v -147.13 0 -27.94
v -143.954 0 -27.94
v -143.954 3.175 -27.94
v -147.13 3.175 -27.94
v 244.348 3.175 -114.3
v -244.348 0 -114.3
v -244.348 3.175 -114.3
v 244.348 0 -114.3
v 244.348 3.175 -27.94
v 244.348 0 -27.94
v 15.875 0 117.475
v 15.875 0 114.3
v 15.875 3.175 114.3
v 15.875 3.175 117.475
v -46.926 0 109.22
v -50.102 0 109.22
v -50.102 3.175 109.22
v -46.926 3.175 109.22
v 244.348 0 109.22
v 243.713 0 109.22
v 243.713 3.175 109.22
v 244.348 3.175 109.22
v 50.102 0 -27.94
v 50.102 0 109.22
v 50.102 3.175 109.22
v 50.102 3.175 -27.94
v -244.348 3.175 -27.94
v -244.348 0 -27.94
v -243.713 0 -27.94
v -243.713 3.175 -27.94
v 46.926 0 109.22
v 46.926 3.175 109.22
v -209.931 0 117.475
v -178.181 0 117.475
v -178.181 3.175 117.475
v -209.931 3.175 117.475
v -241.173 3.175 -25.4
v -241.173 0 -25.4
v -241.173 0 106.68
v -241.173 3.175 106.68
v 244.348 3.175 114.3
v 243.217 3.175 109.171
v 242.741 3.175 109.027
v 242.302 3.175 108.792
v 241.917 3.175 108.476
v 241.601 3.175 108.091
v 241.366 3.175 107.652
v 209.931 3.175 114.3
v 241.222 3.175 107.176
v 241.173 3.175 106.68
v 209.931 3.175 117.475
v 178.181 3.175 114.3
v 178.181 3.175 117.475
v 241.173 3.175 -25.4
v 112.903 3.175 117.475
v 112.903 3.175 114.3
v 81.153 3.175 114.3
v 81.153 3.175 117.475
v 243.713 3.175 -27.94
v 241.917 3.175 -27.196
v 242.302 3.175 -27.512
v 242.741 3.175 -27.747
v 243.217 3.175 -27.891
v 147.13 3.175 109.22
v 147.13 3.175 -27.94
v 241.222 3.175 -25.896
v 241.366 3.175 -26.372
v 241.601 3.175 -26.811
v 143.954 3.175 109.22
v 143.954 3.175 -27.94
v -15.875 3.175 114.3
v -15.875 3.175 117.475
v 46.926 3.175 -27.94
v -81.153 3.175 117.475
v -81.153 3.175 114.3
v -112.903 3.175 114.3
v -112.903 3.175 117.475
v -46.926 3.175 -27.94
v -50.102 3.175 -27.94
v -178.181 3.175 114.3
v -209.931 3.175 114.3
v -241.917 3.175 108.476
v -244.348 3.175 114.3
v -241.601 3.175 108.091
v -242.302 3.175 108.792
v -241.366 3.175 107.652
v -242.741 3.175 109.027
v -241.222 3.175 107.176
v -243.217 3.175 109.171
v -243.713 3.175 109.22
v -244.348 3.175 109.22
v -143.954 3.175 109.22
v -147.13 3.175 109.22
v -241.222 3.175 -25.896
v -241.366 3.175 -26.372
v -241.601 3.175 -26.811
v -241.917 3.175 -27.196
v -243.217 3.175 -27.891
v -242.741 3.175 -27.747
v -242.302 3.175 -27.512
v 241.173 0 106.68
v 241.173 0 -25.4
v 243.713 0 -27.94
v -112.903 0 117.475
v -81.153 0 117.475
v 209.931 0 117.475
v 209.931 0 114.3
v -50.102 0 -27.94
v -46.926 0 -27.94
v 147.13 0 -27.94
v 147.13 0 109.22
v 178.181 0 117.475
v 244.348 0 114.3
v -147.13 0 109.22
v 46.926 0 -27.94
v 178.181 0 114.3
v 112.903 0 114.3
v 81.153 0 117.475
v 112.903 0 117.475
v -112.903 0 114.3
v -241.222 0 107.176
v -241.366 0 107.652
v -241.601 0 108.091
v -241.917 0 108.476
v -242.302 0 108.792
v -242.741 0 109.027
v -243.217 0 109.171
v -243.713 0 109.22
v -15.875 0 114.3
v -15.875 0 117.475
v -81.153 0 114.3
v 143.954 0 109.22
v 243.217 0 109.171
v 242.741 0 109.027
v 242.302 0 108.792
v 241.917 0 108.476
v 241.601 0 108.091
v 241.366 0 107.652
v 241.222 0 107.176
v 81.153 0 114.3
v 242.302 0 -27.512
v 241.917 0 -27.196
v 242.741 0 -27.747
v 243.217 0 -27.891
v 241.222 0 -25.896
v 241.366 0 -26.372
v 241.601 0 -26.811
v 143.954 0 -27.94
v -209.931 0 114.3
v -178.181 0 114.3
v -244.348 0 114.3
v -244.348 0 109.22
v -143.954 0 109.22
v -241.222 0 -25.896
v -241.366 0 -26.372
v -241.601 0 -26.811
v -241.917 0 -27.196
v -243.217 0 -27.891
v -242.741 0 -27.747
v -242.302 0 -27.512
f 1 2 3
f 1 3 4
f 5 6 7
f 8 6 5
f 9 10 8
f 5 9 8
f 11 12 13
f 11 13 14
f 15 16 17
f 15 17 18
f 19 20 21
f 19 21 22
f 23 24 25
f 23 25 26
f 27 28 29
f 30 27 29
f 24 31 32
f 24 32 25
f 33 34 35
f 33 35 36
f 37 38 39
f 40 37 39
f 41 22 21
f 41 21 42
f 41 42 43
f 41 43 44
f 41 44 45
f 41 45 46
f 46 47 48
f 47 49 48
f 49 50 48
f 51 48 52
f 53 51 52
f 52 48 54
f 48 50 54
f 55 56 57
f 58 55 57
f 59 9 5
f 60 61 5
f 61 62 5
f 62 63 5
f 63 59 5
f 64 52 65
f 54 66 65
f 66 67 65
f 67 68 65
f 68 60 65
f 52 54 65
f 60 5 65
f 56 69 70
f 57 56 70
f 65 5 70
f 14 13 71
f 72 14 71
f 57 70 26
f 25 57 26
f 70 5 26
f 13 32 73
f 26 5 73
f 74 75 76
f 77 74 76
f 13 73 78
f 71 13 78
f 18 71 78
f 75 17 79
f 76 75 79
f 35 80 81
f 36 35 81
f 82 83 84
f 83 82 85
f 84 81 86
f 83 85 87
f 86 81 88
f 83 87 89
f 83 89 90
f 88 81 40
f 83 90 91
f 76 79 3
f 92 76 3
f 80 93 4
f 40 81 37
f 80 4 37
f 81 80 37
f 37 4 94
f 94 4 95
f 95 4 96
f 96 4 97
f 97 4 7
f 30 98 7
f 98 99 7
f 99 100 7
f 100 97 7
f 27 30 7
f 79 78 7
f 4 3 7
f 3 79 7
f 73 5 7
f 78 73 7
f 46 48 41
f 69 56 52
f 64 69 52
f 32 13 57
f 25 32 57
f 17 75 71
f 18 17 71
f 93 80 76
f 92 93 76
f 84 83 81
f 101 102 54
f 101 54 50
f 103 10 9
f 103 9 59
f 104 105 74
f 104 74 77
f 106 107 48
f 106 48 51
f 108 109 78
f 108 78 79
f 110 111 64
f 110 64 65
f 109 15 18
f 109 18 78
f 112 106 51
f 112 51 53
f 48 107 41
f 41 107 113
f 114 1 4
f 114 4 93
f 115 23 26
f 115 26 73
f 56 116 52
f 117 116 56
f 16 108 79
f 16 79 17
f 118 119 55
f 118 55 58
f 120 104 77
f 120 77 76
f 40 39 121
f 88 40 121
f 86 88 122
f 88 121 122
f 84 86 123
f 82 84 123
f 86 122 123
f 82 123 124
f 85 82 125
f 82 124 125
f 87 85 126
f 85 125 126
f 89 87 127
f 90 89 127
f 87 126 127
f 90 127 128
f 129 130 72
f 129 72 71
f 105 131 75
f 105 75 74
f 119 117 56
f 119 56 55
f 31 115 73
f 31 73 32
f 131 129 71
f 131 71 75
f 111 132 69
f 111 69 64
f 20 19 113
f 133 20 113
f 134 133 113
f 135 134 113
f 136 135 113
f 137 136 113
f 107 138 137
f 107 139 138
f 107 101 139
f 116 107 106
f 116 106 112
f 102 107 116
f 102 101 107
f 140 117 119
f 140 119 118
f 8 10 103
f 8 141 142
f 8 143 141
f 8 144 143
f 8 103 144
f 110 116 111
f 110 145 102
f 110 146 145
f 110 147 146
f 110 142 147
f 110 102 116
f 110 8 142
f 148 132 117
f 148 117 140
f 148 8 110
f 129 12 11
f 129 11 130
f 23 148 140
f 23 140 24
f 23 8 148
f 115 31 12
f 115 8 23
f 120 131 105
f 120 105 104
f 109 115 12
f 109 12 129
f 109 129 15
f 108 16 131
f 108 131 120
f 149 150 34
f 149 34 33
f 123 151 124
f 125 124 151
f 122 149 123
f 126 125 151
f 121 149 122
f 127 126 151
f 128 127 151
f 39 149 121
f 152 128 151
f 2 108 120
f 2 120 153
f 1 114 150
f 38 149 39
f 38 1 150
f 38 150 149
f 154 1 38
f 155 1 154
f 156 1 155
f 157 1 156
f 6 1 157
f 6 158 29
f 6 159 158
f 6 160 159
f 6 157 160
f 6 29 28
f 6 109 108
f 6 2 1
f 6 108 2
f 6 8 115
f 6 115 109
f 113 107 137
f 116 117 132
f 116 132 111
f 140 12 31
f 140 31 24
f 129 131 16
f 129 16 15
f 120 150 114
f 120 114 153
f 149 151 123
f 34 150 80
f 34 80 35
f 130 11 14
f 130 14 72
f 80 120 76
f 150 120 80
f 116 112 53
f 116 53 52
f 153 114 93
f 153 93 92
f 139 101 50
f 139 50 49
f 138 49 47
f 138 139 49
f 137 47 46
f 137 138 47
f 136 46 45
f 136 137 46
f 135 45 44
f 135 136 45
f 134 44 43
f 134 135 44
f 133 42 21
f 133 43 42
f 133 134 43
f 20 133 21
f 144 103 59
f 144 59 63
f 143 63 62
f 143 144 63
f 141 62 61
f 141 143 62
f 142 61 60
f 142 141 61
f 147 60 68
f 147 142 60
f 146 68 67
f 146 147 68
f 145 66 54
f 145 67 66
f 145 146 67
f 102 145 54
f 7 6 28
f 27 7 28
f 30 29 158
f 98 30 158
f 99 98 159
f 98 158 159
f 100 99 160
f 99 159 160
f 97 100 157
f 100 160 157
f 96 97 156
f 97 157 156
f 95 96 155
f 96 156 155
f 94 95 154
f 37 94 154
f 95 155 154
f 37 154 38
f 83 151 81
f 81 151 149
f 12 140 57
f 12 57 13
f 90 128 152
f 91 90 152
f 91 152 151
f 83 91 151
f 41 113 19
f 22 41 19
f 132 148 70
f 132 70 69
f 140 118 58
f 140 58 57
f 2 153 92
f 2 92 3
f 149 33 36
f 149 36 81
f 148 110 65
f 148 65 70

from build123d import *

# Parameters (mm, degrees)
BOSS_EXTRUDE1_DEPTH     = 3.175
CUT_EXTRUDE1_DEPTH      = 272.1390812
CUT_EXTRUDE1_DEPTH_BACK = 272.1390812
CUT_EXTRUDE3_DEPTH      = 272.1390812
CUT_EXTRUDE3_DEPTH_BACK = 272.1390812


with BuildPart() as part:
    # Sketch1 → Boss-Extrude1 (new body)
    with BuildSketch(Plane(origin=(0, 0, 0), x_dir=(1, 0, 0), z_dir=(0, 1, 0))):
        Polygon((-244.348, 114.3), (244.348, 114.3), (244.348, 31.75), (244.348, -114.3), (241.173, -114.3), (209.931, -114.3), (209.931, -117.475), (178.181, -117.475), (178.181, -114.3), (112.903, -114.3), (112.903, -117.475), (81.153, -117.475), (81.153, -114.3), (15.875, -114.3), (15.875, -117.475), (-15.875, -117.475), (-15.875, -114.3), (-81.153, -114.3), (-81.153, -117.475), (-112.903, -117.475), (-112.903, -114.3), (-178.181, -114.3), (-178.181, -117.475), (-209.931, -117.475), (-209.931, -114.3), (-241.173, -114.3), (-244.348, -114.3), (-244.348, 31.75), align=None)
    extrude(amount=BOSS_EXTRUDE1_DEPTH)

    # Sketch2 → Cut-Extrude1 (cut, two sides: drawn at the far end of the back side and taken through both)
    with BuildSketch(Plane(origin=(0, 3.175, 0), x_dir=(1, 0, 0), z_dir=(0, 1, 0)).offset(-CUT_EXTRUDE1_DEPTH_BACK)):
        with BuildLine():
            Line((244.348, 27.94), (243.713, 27.94))
            ThreePointArc((243.713, 27.94), (241.916948776, 27.196051224), (241.173, 25.4))
            Line((241.173, 25.4), (241.173, -106.68))
            ThreePointArc((241.173, -106.68), (241.916948776, -108.476051224), (243.713, -109.22))
            Line((243.713, -109.22), (244.348, -109.22))
            Line((244.348, -109.22), (244.348, 27.94))
        make_face()
        with BuildLine():
            Line((-243.713, -109.22), (-244.348, -109.22))
            Line((-244.348, -109.22), (-244.348, 27.94))
            Line((-244.348, 27.94), (-243.713, 27.94))
            ThreePointArc((-243.713, 27.94), (-241.916948776, 27.196051224), (-241.173, 25.4))
            Line((-241.173, 25.4), (-241.173, -106.68))
            ThreePointArc((-241.173, -106.68), (-241.916948776, -108.476051224), (-243.713, -109.22))
        make_face()
    extrude(amount=CUT_EXTRUDE1_DEPTH + CUT_EXTRUDE1_DEPTH_BACK, mode=Mode.SUBTRACT)

    # Sketch4 → Cut-Extrude3 (cut, two sides: drawn at the far end of the back side and taken through both)
    with BuildSketch(Plane(origin=(0, 3.175, 0), x_dir=(1, 0, 0), z_dir=(0, 1, 0)).offset(-CUT_EXTRUDE3_DEPTH_BACK)):
        Polygon((-145.542, 27.94), (-147.1295, 27.94), (-147.1295, -109.22), (-145.542, -109.22), (-143.9545, -109.22), (-143.9545, 27.94), align=None)
        Polygon((-50.1015, -109.22), (-48.514, -109.22), (-46.9265, -109.22), (-46.9265, 27.94), (-48.514, 27.94), (-50.1015, 27.94), align=None)
        Polygon((46.9265, -109.22), (48.514, -109.22), (50.1015, -109.22), (50.1015, 27.94), (48.514, 27.94), (46.9265, 27.94), align=None)
        Polygon((143.9545, -109.22), (145.542, -109.22), (147.1295, -109.22), (147.1295, 27.94), (145.542, 27.94), (143.9545, 27.94), align=None)
    extrude(amount=CUT_EXTRUDE3_DEPTH + CUT_EXTRUDE3_DEPTH_BACK, mode=Mode.SUBTRACT)


solid = part.part
